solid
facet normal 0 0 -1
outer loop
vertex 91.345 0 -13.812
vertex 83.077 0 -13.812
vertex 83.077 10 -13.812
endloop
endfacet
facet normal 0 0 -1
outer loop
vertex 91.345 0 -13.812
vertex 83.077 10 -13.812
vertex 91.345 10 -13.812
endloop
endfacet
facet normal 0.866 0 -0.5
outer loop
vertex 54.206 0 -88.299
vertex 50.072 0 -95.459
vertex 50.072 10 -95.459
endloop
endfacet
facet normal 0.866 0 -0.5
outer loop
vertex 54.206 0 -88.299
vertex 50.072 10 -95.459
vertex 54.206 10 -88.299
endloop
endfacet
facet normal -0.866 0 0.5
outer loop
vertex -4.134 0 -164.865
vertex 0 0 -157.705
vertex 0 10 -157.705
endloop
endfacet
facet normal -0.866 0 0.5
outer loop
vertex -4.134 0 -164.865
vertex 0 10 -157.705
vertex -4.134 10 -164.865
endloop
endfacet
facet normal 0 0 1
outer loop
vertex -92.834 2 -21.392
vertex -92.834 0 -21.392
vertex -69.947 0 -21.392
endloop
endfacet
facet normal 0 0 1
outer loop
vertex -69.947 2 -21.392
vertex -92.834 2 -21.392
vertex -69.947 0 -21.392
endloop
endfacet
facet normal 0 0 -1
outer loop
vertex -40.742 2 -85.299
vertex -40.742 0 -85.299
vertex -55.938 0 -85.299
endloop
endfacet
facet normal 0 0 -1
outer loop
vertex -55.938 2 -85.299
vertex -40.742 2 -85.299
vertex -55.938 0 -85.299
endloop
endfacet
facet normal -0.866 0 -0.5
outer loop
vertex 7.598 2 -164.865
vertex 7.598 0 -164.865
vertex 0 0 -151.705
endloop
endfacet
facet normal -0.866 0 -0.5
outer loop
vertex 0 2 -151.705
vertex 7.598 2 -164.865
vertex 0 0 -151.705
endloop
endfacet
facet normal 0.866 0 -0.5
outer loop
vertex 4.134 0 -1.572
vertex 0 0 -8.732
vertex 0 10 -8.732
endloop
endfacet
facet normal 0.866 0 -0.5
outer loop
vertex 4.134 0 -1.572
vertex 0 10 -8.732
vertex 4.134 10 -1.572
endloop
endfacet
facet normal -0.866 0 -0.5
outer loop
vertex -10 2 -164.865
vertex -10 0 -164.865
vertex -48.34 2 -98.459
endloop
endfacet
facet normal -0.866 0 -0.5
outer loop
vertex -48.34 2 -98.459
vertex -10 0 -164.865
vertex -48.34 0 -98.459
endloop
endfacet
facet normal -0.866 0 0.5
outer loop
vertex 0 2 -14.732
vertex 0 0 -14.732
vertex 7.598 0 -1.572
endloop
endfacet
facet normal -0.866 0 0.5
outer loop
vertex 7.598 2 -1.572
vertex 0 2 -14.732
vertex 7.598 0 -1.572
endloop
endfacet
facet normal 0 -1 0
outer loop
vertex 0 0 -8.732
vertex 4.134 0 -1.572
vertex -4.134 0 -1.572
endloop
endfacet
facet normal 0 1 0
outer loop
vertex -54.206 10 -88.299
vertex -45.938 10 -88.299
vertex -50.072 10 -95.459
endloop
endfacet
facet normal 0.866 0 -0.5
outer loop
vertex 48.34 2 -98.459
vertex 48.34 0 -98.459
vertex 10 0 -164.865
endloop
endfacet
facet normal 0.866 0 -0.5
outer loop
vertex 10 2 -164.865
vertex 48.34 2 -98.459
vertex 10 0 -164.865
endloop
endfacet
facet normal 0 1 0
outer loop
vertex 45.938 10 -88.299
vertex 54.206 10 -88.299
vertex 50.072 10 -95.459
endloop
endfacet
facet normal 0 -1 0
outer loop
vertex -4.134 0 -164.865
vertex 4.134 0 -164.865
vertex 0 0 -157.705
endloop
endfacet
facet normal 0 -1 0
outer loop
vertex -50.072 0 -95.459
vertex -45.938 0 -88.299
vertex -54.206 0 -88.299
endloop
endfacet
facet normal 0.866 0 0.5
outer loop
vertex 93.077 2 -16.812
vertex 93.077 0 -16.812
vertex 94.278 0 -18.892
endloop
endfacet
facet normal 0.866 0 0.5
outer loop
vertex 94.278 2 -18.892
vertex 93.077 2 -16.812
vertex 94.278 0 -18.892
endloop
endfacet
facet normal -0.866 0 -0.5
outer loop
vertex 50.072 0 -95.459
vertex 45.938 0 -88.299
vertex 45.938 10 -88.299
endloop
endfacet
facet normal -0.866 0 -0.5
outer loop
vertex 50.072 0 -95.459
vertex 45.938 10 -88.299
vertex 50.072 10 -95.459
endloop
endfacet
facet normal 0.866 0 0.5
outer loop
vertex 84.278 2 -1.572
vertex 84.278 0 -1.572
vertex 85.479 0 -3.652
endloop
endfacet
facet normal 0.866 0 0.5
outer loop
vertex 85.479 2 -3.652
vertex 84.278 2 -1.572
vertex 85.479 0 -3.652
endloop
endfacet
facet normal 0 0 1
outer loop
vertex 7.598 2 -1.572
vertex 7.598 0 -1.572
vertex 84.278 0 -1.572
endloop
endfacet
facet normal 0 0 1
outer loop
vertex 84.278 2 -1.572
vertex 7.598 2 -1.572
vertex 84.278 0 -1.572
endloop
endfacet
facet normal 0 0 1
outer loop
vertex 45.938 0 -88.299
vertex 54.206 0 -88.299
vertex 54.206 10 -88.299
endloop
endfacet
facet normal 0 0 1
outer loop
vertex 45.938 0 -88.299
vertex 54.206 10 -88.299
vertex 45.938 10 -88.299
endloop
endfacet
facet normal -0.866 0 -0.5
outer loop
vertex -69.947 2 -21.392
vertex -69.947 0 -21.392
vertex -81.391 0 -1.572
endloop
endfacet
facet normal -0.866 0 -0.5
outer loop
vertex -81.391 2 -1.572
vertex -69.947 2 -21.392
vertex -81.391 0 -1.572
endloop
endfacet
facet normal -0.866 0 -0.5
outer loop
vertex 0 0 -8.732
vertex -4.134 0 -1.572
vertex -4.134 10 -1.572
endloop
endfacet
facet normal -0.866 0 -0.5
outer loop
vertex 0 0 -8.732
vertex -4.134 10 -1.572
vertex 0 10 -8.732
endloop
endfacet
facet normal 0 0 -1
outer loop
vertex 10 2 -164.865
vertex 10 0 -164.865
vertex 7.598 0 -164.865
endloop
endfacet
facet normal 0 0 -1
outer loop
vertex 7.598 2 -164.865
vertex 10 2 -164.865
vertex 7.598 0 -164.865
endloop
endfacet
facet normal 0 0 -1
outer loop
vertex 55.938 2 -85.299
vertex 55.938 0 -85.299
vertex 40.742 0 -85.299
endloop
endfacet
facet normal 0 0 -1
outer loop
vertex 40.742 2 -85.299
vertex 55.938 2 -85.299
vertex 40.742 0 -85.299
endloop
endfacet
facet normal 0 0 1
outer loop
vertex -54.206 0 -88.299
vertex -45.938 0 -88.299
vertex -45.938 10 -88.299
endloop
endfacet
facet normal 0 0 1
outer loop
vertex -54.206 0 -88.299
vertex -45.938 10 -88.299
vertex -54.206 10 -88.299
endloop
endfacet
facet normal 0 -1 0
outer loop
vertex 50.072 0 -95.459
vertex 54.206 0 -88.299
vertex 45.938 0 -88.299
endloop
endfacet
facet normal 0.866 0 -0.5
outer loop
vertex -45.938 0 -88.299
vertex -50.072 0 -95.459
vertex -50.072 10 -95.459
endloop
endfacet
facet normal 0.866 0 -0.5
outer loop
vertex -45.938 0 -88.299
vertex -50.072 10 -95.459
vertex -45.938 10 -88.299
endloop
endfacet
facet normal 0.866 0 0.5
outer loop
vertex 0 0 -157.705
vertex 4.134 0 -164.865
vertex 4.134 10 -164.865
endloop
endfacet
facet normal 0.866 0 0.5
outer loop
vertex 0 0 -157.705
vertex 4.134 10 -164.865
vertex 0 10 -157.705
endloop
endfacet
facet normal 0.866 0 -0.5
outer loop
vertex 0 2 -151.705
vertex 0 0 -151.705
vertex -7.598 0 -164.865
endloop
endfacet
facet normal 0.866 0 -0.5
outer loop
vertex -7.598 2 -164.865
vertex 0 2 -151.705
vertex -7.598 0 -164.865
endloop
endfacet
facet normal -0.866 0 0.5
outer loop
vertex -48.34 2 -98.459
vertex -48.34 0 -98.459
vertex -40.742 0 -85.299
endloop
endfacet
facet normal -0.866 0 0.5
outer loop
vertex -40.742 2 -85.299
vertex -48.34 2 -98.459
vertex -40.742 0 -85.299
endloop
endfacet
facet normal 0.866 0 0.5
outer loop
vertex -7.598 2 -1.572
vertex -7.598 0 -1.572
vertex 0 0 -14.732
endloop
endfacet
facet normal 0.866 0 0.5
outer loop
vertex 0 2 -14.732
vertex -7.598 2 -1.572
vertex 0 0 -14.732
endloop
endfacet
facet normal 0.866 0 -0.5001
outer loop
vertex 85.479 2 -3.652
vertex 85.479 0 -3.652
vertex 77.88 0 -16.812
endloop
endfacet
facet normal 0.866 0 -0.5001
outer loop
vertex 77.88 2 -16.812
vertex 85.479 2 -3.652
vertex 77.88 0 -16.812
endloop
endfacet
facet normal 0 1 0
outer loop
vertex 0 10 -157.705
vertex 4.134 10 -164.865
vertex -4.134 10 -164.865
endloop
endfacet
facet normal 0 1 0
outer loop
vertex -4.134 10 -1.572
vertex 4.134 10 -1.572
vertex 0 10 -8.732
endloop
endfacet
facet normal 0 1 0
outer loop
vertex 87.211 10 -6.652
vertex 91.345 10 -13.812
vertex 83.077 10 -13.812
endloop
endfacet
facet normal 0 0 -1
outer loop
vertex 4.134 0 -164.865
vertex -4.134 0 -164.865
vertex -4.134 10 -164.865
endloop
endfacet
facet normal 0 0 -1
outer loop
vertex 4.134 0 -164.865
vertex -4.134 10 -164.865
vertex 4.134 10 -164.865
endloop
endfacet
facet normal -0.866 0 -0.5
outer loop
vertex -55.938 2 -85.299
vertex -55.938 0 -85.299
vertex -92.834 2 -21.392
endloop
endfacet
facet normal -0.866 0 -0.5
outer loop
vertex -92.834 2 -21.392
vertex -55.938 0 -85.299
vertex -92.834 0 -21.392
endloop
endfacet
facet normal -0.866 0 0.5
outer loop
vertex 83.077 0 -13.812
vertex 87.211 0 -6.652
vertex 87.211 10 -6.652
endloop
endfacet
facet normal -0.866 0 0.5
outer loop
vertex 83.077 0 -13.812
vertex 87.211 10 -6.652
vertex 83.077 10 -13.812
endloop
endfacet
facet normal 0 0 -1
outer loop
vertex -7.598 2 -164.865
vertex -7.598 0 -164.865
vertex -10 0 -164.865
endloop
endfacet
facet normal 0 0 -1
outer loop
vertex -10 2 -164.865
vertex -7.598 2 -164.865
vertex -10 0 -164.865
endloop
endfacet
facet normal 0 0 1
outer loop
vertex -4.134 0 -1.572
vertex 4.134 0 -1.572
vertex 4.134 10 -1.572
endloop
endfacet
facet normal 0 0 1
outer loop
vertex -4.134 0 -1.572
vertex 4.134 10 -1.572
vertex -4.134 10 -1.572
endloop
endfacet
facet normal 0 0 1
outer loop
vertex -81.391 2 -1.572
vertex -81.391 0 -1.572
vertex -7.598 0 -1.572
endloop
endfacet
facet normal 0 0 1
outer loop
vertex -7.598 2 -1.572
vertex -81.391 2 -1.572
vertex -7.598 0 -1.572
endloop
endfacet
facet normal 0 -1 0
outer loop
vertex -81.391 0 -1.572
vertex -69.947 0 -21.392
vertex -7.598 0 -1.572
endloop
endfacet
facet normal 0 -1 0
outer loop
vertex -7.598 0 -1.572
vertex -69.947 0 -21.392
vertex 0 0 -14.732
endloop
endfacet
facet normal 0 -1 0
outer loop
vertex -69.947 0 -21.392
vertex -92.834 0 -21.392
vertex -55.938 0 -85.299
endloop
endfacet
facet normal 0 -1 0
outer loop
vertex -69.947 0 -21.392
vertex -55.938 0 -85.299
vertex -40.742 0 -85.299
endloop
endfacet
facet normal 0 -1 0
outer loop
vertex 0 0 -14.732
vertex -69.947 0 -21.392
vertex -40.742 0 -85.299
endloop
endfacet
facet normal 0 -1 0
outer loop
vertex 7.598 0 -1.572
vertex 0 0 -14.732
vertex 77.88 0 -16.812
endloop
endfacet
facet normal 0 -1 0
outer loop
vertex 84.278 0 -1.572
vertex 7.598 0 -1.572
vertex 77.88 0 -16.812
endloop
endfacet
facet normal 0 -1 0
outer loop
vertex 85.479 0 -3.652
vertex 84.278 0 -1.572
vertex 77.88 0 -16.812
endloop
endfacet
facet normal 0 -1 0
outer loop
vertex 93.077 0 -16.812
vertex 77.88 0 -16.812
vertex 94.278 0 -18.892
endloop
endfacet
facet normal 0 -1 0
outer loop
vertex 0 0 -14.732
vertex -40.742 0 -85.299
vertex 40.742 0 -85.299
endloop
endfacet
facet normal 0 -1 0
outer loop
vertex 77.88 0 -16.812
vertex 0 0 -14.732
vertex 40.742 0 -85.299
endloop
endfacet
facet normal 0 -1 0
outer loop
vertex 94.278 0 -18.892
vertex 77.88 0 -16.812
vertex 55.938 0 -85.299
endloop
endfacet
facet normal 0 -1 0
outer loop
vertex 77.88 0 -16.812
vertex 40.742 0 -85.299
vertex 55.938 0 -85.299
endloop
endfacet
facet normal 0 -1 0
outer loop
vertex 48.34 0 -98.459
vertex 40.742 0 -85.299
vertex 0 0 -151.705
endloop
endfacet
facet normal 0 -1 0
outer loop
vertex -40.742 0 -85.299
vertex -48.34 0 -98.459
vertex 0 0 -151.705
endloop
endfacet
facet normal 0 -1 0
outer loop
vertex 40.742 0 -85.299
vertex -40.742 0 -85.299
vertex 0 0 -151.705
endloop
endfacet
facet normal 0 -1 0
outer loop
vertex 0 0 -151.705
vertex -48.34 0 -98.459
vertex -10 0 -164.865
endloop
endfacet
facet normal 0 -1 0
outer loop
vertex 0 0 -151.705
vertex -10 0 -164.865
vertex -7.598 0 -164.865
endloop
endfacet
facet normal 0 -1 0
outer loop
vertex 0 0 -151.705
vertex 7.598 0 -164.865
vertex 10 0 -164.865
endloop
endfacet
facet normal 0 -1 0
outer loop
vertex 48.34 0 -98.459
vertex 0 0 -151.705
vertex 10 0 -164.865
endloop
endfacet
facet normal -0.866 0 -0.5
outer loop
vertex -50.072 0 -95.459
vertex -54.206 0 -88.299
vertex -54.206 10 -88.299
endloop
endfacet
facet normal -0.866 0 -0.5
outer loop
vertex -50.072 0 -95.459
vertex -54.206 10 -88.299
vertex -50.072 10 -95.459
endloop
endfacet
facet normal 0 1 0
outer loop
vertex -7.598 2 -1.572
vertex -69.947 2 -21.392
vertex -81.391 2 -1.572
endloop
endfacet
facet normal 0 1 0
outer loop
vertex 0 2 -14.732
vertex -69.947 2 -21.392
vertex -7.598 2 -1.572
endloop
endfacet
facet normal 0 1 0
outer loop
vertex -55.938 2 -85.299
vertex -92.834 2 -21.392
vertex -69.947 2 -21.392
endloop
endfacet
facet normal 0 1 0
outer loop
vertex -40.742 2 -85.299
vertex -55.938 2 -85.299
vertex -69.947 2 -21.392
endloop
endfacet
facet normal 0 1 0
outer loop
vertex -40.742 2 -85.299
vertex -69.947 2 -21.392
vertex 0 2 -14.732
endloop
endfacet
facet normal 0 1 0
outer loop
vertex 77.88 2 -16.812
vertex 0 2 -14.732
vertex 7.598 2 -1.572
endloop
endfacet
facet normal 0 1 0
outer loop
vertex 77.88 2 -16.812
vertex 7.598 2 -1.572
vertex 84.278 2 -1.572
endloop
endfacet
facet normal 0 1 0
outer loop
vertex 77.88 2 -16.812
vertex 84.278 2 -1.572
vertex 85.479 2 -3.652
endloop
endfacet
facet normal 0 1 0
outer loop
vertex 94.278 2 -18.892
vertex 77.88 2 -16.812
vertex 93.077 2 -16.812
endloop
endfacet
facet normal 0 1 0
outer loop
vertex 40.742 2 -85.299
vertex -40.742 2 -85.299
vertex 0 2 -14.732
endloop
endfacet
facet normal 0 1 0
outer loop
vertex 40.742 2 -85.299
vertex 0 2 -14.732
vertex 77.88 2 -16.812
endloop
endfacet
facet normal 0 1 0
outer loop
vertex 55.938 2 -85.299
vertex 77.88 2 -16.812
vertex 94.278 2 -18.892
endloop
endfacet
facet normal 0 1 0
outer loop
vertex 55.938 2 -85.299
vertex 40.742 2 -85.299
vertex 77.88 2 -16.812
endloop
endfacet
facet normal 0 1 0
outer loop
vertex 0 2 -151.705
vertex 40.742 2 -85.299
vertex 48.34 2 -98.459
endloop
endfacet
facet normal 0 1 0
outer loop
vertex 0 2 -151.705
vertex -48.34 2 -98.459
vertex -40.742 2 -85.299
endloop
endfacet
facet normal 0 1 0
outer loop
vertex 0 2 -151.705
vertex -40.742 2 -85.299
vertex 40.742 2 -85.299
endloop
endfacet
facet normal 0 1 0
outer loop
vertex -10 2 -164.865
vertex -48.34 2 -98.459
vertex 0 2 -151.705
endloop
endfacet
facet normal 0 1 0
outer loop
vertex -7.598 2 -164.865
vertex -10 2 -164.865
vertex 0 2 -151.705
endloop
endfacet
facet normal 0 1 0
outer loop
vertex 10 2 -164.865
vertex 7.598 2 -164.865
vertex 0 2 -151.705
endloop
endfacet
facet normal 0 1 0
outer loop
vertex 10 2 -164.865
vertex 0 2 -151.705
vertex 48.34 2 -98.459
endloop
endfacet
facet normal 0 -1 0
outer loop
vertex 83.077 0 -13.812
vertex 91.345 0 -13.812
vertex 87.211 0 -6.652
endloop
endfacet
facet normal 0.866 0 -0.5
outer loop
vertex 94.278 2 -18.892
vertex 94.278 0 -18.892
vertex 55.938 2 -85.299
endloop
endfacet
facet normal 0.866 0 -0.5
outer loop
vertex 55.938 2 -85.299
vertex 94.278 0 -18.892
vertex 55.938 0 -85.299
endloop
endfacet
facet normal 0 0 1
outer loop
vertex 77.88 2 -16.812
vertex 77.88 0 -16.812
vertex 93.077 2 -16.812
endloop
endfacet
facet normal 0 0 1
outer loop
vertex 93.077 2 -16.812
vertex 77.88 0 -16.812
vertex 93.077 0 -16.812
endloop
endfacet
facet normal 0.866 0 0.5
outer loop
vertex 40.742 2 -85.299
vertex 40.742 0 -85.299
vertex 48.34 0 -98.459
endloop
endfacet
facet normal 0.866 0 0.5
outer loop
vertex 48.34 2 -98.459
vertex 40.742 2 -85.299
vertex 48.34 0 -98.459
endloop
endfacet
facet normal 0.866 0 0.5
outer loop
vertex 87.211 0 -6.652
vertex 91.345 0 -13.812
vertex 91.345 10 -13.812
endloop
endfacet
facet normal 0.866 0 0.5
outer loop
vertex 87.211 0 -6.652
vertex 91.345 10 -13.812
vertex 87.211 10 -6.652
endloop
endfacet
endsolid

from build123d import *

# Parameters (mm, degrees)
BOSS_EXTRUDE1_DEPTH   = 2
BOSS_EXTRUDE2_DEPTH   = 10
BOSS_EXTRUDE2_2_DEPTH = 10
BOSS_EXTRUDE2_3_DEPTH = 10
BOSS_EXTRUDE2_4_DEPTH = 10
BOSS_EXTRUDE2_5_DEPTH = 10


with BuildPart() as part:
    # Sketch1 → Boss-Extrude1 (new body)
    with BuildSketch(Plane(origin=(0, 0, 0), x_dir=(1, 0, 0), z_dir=(0, 1, 0))):
        Polygon((-92.834192436, 21.392304849), (-55.937822149, 85.298692801), (-40.741669726, 85.298692801), (-48.339745937, 98.458946839), (-9.999999977, 164.865334792), (-7.598076211, 164.865334792), (0, 151.705080754), (7.598076211, 164.865334792), (10.000000007, 164.865334792), (48.33974597, 98.458946834), (40.741669759, 85.298692796), (55.937822182, 85.298692796), (94.277568143, 18.892304841), (93.076606256, 16.812177834), (77.880453952, 16.812177834), (85.478530104, 3.651923899), (84.277568097, 1.571796687), (7.598076284, 1.571796687), (2e-09, 14.732050847), (-7.59807628, 1.571796687), (-81.390816839, 1.571796687), (-69.947441116, 21.392304849), align=None)
    extrude(amount=BOSS_EXTRUDE1_DEPTH)


with BuildPart() as body_2:
    # Sketch1<6> → Boss-Extrude2 (new body)
    with BuildSketch(Plane(origin=(0, 0, 0), x_dir=(1, 0, 0), z_dir=(0, 1, 0))):
        Polygon((-1.2e-07, 8.732050878), (-4.133974466, 1.571796687), (4.133974507, 1.571796687), align=None)
    extrude(amount=BOSS_EXTRUDE2_DEPTH)


with BuildPart() as body_3:
    # Sketch1<6> → Boss-Extrude2 2 (new body)
    with BuildSketch(Plane(origin=(0, 0, 0), x_dir=(1, 0, 0), z_dir=(0, 1, 0))):
        Polygon((91.344555444, 13.812177834), (83.076606252, 13.812177834), (87.210580848, 6.651923796), align=None)
    extrude(amount=BOSS_EXTRUDE2_2_DEPTH)


with BuildPart() as body_4:
    # Sketch1<6> → Boss-Extrude2 3 (new body)
    with BuildSketch(Plane(origin=(0, 0, 0), x_dir=(1, 0, 0), z_dir=(0, 1, 0))):
        Polygon((50.071796778, 95.458946841), (45.937822182, 88.298692803), (54.205771374, 88.298692803), align=None)
    extrude(amount=BOSS_EXTRUDE2_3_DEPTH)


with BuildPart() as body_5:
    # Sketch1<6> → Boss-Extrude2 4 (new body)
    with BuildSketch(Plane(origin=(0, 0, 0), x_dir=(1, 0, 0), z_dir=(0, 1, 0))):
        Polygon((4.133974596, 164.865334799), (-4.133974596, 164.865334799), (0, 157.705080761), align=None)
    extrude(amount=BOSS_EXTRUDE2_4_DEPTH)


with BuildPart() as body_6:
    # Sketch1<6> → Boss-Extrude2 5 (new body)
    with BuildSketch(Plane(origin=(0, 0, 0), x_dir=(1, 0, 0), z_dir=(0, 1, 0))):
        Polygon((-50.071796745, 95.458946839), (-54.205771341, 88.298692801), (-45.937822149, 88.298692801), align=None)
    extrude(amount=BOSS_EXTRUDE2_5_DEPTH)


solid = Compound([part.part, body_2.part, body_3.part, body_4.part, body_5.part, body_6.part])
